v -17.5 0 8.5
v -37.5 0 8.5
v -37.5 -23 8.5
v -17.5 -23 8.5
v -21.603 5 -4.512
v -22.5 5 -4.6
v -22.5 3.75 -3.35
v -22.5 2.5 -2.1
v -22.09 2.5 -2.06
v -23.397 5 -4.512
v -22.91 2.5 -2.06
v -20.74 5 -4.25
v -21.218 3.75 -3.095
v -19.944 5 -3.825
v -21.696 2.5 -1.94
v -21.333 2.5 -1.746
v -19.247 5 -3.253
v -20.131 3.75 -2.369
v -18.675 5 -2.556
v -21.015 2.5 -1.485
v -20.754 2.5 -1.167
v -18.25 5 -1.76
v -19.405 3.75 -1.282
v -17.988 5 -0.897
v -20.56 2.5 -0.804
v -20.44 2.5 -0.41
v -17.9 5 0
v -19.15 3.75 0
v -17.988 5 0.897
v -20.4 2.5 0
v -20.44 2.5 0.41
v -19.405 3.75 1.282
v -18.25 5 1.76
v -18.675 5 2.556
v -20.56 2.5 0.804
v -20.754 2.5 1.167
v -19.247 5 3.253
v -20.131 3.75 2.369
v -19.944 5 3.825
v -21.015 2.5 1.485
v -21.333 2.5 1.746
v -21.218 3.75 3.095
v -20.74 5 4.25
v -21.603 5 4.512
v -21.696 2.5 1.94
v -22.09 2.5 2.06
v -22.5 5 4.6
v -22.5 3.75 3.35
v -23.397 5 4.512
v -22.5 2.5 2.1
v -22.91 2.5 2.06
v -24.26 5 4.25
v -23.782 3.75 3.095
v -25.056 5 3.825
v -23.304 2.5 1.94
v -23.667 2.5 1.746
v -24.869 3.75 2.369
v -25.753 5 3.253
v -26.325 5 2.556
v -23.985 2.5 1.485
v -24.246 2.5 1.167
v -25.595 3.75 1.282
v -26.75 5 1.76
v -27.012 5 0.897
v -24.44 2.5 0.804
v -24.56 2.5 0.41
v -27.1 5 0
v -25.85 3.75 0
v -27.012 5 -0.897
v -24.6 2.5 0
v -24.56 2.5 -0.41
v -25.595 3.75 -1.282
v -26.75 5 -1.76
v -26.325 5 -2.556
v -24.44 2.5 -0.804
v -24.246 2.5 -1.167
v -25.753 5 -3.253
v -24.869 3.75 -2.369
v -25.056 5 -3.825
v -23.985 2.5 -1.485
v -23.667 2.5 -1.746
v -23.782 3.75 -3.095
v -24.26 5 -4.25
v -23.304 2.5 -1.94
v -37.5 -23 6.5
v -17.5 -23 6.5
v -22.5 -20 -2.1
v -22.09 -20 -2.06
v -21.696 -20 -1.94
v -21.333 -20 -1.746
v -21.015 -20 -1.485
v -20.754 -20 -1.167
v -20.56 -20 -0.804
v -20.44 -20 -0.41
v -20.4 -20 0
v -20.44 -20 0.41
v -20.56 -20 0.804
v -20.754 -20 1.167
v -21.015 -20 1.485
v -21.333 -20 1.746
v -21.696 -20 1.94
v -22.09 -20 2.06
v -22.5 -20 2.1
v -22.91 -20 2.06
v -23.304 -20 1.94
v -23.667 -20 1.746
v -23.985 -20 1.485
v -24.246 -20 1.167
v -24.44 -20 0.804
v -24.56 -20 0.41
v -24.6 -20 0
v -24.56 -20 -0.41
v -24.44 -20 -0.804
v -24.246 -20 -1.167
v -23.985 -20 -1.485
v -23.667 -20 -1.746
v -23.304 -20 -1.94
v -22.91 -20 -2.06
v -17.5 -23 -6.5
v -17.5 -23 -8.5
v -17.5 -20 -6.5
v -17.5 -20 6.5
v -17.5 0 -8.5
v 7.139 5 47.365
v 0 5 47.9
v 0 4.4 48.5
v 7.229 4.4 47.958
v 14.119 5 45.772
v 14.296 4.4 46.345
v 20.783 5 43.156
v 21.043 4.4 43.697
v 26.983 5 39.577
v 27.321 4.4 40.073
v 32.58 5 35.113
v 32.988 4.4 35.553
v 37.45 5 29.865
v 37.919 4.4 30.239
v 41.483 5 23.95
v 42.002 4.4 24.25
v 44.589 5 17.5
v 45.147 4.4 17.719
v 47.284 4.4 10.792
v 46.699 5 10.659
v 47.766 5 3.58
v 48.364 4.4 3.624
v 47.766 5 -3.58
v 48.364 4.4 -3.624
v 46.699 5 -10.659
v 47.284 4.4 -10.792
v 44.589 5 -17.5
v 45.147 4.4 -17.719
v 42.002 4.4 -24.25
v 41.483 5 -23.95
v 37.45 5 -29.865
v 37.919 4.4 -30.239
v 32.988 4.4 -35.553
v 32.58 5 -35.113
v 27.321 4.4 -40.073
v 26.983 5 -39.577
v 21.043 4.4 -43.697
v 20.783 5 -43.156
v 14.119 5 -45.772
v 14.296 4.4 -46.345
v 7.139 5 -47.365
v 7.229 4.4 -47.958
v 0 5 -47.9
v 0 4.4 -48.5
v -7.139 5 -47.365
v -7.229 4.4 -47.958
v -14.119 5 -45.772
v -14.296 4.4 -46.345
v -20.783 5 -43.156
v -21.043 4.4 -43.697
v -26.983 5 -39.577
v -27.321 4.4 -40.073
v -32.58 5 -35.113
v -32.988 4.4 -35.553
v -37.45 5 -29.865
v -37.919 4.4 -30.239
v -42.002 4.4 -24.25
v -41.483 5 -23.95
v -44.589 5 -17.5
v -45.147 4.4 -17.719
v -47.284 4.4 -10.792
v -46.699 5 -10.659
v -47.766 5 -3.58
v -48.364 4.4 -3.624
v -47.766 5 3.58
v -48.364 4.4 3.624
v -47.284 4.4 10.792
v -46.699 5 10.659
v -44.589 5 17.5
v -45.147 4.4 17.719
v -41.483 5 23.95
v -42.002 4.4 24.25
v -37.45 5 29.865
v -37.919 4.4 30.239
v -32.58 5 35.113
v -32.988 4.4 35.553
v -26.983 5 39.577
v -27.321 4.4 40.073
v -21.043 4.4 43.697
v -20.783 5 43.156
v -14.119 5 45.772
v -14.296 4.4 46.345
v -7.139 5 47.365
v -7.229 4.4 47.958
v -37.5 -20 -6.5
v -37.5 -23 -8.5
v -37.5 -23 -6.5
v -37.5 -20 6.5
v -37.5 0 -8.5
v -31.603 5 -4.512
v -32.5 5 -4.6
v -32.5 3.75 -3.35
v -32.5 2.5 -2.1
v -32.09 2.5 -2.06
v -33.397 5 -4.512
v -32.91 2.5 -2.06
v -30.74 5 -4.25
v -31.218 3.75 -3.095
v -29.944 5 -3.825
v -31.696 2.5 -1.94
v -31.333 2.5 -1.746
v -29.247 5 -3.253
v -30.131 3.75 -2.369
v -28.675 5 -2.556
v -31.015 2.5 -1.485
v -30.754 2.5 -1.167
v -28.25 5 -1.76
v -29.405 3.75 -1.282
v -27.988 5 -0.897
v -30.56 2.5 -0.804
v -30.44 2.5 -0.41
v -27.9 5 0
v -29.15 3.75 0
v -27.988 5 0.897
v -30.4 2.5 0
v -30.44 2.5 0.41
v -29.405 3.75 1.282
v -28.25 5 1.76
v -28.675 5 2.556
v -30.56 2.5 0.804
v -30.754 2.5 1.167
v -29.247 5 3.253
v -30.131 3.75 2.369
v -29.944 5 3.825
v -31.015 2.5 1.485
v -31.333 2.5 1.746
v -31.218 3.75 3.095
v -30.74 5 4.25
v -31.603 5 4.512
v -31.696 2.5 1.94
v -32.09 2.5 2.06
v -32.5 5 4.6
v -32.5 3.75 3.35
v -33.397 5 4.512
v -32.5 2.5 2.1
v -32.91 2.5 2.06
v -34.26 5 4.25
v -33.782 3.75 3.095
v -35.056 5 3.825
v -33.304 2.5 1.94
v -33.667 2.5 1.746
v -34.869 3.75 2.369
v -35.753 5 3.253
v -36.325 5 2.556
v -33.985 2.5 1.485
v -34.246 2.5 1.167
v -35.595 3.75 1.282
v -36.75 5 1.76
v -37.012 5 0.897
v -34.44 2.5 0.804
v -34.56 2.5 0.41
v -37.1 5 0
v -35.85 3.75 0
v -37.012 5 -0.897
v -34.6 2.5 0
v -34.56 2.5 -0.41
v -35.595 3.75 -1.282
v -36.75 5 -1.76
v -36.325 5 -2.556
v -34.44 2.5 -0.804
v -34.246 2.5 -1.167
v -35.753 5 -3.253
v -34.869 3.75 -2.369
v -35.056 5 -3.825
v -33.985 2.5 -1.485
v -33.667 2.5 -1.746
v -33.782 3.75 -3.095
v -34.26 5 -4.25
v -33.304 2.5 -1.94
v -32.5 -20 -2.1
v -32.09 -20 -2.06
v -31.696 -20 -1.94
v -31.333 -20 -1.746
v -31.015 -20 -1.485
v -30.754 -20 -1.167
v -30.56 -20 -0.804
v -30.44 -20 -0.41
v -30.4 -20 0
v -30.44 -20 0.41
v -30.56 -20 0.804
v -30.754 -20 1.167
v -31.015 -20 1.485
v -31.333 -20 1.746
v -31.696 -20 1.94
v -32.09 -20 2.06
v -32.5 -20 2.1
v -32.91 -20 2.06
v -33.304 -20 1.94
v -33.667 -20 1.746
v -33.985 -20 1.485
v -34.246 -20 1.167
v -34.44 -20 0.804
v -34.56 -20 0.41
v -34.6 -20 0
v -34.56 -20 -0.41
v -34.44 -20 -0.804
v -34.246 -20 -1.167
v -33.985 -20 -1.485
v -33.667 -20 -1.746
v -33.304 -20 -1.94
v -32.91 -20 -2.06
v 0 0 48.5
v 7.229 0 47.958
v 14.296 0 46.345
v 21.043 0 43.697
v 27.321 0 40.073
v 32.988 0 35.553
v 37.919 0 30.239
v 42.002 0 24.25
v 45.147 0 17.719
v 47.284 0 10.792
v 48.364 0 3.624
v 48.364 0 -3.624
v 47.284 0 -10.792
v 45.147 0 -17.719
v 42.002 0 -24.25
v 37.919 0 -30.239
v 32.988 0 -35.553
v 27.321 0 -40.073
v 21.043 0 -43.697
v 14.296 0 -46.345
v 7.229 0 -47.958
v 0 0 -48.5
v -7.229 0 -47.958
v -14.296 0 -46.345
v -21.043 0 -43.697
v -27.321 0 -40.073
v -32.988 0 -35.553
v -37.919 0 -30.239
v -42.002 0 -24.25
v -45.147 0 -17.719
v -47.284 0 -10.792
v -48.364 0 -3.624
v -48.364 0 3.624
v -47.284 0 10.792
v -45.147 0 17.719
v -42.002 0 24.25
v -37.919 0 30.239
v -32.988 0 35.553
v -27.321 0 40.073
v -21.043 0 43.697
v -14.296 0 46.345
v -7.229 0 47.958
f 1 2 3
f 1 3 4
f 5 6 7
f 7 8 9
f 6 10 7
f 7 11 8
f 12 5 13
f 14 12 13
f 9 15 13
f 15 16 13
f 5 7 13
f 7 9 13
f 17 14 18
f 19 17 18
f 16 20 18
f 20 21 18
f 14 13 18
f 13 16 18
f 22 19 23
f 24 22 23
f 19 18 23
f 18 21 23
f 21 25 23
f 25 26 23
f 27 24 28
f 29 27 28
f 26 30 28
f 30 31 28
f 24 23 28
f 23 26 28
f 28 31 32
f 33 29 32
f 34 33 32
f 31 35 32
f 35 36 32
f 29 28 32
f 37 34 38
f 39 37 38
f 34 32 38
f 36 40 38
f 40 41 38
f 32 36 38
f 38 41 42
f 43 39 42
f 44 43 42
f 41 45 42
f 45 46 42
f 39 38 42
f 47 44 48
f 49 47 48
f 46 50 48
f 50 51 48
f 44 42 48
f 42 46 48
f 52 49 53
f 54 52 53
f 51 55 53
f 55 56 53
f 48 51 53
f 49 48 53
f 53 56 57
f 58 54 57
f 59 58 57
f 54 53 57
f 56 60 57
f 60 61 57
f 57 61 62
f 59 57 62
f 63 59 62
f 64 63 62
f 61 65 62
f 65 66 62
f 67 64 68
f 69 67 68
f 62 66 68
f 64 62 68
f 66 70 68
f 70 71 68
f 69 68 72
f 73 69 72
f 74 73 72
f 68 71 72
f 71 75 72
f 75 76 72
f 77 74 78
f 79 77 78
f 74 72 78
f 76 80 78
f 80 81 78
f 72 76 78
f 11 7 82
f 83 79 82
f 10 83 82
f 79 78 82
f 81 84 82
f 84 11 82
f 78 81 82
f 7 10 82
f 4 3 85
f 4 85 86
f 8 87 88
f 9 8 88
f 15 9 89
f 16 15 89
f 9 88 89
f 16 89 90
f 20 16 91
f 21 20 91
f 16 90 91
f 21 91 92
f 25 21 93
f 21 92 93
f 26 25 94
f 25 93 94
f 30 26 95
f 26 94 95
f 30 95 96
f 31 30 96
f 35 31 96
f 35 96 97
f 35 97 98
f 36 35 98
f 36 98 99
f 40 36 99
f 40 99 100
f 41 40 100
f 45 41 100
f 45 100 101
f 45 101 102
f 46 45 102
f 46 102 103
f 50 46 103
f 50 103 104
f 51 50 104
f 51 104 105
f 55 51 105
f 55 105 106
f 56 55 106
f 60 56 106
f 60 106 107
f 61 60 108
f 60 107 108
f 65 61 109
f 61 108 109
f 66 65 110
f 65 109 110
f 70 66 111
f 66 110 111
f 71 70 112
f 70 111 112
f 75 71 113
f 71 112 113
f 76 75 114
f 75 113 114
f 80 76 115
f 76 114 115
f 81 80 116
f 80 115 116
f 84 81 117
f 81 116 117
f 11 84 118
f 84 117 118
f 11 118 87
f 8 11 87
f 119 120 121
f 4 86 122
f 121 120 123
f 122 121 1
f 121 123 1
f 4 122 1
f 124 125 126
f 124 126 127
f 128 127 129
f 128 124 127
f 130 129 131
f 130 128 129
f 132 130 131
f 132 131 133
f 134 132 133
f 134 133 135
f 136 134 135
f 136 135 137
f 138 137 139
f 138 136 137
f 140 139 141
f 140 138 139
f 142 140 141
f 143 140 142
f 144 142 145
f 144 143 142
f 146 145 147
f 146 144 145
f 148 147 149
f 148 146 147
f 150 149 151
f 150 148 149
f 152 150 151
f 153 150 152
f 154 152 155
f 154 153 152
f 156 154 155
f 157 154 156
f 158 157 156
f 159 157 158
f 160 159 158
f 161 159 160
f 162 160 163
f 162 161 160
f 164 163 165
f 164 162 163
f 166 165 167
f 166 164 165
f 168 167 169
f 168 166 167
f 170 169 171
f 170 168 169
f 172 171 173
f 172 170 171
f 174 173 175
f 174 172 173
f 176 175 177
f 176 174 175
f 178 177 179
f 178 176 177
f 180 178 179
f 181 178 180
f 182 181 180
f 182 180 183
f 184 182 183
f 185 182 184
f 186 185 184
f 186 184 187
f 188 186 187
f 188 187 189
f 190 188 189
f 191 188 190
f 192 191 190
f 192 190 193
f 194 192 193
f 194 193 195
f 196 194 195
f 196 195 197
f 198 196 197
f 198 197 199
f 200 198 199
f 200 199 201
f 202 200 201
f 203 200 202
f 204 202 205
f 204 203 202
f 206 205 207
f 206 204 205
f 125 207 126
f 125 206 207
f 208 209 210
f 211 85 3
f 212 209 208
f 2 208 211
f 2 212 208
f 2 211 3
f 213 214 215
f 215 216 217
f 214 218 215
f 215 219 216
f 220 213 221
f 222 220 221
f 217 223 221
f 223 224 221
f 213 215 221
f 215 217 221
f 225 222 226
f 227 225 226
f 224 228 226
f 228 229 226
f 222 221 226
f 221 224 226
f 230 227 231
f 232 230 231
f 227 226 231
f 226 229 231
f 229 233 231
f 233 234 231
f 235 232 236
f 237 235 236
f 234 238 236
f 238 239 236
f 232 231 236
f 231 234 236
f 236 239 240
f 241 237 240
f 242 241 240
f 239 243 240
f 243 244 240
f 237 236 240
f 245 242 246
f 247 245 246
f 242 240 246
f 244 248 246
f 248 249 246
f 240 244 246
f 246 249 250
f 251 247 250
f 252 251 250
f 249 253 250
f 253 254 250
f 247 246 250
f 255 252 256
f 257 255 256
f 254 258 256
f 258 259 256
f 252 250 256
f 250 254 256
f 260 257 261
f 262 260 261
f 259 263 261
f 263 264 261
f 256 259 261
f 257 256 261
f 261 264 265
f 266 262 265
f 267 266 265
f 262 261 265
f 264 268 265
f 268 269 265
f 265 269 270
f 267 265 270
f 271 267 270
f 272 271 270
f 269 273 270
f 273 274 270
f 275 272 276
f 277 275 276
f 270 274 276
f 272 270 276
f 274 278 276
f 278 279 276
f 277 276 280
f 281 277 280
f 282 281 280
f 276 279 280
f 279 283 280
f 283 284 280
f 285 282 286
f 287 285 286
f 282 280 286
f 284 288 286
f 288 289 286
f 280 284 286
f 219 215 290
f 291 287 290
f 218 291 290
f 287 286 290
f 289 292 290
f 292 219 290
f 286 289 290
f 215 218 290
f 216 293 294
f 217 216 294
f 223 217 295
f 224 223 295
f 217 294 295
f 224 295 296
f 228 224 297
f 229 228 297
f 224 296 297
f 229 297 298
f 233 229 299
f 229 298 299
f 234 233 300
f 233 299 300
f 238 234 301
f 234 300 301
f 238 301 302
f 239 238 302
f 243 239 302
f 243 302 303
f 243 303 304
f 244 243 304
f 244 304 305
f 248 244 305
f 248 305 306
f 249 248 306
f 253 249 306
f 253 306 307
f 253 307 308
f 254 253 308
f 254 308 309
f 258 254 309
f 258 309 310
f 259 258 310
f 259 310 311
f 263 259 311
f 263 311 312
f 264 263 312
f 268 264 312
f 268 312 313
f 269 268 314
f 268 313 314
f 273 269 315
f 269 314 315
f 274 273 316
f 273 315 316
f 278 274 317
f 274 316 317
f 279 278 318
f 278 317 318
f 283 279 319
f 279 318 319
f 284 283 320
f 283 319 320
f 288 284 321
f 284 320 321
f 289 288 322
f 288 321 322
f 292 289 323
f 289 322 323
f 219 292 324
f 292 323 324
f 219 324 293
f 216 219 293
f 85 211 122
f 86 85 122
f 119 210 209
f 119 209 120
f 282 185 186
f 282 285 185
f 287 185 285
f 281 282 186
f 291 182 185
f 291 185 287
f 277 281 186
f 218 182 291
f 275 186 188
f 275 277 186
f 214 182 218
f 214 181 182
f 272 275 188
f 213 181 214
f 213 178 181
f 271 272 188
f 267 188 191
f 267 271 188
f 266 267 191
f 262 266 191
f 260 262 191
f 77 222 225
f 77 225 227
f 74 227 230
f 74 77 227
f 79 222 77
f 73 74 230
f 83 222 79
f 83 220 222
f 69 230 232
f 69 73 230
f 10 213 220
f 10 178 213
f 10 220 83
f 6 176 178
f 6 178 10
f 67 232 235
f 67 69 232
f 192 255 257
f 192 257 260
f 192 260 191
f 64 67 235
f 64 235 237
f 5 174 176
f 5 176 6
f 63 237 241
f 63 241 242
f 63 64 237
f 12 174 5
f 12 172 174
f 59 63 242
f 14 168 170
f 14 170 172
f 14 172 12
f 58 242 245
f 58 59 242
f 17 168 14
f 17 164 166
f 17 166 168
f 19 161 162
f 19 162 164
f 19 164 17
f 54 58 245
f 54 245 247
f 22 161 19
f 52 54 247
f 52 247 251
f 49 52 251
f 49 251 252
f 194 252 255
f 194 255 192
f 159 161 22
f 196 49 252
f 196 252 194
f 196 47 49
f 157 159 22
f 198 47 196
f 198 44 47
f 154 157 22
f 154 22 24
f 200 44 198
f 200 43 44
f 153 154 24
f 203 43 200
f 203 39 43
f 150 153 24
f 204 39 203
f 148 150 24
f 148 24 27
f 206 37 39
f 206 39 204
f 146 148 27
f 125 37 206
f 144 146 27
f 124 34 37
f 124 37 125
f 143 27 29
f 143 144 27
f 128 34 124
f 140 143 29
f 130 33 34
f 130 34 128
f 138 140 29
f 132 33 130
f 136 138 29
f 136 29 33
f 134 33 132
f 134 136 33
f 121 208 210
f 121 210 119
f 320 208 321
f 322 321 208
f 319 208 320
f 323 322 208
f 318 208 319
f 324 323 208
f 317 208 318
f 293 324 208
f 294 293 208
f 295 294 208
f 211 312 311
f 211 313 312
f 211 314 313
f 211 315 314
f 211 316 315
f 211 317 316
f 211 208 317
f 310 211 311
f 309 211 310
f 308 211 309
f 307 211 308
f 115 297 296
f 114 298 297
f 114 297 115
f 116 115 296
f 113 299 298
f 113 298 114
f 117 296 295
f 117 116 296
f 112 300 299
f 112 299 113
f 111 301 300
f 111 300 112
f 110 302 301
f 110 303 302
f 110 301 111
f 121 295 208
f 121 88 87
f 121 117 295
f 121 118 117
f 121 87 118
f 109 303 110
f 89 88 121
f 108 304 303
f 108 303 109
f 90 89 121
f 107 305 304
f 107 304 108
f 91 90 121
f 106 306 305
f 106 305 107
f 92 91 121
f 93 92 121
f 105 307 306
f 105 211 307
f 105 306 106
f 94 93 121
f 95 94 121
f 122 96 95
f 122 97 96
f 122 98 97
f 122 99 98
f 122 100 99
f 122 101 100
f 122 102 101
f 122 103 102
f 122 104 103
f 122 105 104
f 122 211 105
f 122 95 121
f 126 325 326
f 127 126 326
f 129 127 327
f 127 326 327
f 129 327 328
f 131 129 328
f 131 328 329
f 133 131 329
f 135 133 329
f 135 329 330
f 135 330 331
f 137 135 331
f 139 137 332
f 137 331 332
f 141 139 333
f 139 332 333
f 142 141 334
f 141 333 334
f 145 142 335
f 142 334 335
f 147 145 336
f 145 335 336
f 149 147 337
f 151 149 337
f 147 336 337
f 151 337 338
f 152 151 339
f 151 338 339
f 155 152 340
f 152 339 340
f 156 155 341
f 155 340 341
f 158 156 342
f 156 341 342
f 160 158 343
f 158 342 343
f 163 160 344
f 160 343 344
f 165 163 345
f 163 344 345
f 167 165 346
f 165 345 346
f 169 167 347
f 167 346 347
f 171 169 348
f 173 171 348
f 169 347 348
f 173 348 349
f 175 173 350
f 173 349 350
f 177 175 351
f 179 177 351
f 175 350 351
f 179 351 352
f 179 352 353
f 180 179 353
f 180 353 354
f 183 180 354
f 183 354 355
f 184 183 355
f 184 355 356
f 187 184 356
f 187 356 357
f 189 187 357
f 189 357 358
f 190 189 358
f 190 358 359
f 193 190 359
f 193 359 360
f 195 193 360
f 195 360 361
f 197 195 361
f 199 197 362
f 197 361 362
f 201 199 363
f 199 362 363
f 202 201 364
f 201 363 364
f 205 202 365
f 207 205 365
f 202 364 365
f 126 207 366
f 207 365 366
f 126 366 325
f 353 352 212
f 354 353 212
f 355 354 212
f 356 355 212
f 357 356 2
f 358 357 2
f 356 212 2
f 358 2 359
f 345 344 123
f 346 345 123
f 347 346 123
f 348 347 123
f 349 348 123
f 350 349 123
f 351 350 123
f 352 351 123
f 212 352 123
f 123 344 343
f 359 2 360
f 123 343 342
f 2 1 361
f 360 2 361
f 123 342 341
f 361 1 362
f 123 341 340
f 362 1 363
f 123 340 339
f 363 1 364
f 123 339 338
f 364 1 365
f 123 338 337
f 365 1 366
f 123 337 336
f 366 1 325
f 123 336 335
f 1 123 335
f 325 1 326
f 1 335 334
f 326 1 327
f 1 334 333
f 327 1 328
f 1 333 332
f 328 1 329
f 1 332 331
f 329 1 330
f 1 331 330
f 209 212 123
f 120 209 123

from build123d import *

# Parameters (mm, degrees)
SKIZZE1_R                       = 48.5
AUFSATZ_LINEAR_AUSTRAGEN1_DEPTH = 5
SKIZZE2_W                       = 20
SKIZZE2_H                       = 13
AUFSATZ_LINEAR_AUSTRAGEN2_DEPTH = 20
SKIZZE3_W                       = 20
SKIZZE3_H                       = 2
AUFSATZ_LINEAR_AUSTRAGEN3_DEPTH = 23
SKIZZE4_R                       = 2.1
SCHNITT_LINEAR_AUSTRAGEN1_DEPTH = 74.003424577
FASE4_SIZE                      = 0.6
FASE6_SIZE                      = 2.5


with BuildPart() as part:
    # Skizze1 → Aufsatz-Linear austragen1 (new body)
    with BuildSketch(Plane(origin=(0, 0, 0), x_dir=(1, 0, 0), z_dir=(0, 1, 0))):
        with Locations(Location((0, 0, 0), (0, 0, 270))):
            Circle(SKIZZE1_R)
    extrude(amount=AUFSATZ_LINEAR_AUSTRAGEN1_DEPTH)

    # Skizze2 → Aufsatz-Linear austragen2 (add)
    with BuildSketch(Plane.XZ):
        with Locations((-27.5, 0)):
            Rectangle(SKIZZE2_W, SKIZZE2_H)
    extrude(amount=AUFSATZ_LINEAR_AUSTRAGEN2_DEPTH)

    # Skizze3 → Aufsatz-Linear austragen3 (add)
    with BuildSketch(Plane.XZ):
        with Locations((-27.5, 7.5)):
            Rectangle(SKIZZE3_W, SKIZZE3_H)
        with Locations((-27.5, -7.5)):
            Rectangle(SKIZZE3_W, SKIZZE3_H)
    extrude(amount=AUFSATZ_LINEAR_AUSTRAGEN3_DEPTH)

    # Skizze4 → Schnitt-Linear austragen1 (cut, through all)
    with BuildSketch(Plane.XZ.offset(20)):
        with Locations(Location((-32.5, 0, 0), (0, 0, 270))):
            Circle(SKIZZE4_R)
        with Locations(Location((-22.5, 0, 0), (0, 0, 270))):
            Circle(SKIZZE4_R)
    extrude(amount=-SCHNITT_LINEAR_AUSTRAGEN1_DEPTH, mode=Mode.SUBTRACT)

    # Fase4
    fase4_edges = [part.edges().sort_by_distance(p)[0] for p in [
        (0, 5, -48.5),
    ]]
    chamfer(fase4_edges, length=FASE4_SIZE)

    # Fase6
    fase6_edges = [part.edges().sort_by_distance(p)[0] for p in [
        (-32.5, 5, 2.1),
        (-22.5, 5, 2.1),
    ]]
    chamfer(fase6_edges, length=FASE6_SIZE)


solid = part.part
